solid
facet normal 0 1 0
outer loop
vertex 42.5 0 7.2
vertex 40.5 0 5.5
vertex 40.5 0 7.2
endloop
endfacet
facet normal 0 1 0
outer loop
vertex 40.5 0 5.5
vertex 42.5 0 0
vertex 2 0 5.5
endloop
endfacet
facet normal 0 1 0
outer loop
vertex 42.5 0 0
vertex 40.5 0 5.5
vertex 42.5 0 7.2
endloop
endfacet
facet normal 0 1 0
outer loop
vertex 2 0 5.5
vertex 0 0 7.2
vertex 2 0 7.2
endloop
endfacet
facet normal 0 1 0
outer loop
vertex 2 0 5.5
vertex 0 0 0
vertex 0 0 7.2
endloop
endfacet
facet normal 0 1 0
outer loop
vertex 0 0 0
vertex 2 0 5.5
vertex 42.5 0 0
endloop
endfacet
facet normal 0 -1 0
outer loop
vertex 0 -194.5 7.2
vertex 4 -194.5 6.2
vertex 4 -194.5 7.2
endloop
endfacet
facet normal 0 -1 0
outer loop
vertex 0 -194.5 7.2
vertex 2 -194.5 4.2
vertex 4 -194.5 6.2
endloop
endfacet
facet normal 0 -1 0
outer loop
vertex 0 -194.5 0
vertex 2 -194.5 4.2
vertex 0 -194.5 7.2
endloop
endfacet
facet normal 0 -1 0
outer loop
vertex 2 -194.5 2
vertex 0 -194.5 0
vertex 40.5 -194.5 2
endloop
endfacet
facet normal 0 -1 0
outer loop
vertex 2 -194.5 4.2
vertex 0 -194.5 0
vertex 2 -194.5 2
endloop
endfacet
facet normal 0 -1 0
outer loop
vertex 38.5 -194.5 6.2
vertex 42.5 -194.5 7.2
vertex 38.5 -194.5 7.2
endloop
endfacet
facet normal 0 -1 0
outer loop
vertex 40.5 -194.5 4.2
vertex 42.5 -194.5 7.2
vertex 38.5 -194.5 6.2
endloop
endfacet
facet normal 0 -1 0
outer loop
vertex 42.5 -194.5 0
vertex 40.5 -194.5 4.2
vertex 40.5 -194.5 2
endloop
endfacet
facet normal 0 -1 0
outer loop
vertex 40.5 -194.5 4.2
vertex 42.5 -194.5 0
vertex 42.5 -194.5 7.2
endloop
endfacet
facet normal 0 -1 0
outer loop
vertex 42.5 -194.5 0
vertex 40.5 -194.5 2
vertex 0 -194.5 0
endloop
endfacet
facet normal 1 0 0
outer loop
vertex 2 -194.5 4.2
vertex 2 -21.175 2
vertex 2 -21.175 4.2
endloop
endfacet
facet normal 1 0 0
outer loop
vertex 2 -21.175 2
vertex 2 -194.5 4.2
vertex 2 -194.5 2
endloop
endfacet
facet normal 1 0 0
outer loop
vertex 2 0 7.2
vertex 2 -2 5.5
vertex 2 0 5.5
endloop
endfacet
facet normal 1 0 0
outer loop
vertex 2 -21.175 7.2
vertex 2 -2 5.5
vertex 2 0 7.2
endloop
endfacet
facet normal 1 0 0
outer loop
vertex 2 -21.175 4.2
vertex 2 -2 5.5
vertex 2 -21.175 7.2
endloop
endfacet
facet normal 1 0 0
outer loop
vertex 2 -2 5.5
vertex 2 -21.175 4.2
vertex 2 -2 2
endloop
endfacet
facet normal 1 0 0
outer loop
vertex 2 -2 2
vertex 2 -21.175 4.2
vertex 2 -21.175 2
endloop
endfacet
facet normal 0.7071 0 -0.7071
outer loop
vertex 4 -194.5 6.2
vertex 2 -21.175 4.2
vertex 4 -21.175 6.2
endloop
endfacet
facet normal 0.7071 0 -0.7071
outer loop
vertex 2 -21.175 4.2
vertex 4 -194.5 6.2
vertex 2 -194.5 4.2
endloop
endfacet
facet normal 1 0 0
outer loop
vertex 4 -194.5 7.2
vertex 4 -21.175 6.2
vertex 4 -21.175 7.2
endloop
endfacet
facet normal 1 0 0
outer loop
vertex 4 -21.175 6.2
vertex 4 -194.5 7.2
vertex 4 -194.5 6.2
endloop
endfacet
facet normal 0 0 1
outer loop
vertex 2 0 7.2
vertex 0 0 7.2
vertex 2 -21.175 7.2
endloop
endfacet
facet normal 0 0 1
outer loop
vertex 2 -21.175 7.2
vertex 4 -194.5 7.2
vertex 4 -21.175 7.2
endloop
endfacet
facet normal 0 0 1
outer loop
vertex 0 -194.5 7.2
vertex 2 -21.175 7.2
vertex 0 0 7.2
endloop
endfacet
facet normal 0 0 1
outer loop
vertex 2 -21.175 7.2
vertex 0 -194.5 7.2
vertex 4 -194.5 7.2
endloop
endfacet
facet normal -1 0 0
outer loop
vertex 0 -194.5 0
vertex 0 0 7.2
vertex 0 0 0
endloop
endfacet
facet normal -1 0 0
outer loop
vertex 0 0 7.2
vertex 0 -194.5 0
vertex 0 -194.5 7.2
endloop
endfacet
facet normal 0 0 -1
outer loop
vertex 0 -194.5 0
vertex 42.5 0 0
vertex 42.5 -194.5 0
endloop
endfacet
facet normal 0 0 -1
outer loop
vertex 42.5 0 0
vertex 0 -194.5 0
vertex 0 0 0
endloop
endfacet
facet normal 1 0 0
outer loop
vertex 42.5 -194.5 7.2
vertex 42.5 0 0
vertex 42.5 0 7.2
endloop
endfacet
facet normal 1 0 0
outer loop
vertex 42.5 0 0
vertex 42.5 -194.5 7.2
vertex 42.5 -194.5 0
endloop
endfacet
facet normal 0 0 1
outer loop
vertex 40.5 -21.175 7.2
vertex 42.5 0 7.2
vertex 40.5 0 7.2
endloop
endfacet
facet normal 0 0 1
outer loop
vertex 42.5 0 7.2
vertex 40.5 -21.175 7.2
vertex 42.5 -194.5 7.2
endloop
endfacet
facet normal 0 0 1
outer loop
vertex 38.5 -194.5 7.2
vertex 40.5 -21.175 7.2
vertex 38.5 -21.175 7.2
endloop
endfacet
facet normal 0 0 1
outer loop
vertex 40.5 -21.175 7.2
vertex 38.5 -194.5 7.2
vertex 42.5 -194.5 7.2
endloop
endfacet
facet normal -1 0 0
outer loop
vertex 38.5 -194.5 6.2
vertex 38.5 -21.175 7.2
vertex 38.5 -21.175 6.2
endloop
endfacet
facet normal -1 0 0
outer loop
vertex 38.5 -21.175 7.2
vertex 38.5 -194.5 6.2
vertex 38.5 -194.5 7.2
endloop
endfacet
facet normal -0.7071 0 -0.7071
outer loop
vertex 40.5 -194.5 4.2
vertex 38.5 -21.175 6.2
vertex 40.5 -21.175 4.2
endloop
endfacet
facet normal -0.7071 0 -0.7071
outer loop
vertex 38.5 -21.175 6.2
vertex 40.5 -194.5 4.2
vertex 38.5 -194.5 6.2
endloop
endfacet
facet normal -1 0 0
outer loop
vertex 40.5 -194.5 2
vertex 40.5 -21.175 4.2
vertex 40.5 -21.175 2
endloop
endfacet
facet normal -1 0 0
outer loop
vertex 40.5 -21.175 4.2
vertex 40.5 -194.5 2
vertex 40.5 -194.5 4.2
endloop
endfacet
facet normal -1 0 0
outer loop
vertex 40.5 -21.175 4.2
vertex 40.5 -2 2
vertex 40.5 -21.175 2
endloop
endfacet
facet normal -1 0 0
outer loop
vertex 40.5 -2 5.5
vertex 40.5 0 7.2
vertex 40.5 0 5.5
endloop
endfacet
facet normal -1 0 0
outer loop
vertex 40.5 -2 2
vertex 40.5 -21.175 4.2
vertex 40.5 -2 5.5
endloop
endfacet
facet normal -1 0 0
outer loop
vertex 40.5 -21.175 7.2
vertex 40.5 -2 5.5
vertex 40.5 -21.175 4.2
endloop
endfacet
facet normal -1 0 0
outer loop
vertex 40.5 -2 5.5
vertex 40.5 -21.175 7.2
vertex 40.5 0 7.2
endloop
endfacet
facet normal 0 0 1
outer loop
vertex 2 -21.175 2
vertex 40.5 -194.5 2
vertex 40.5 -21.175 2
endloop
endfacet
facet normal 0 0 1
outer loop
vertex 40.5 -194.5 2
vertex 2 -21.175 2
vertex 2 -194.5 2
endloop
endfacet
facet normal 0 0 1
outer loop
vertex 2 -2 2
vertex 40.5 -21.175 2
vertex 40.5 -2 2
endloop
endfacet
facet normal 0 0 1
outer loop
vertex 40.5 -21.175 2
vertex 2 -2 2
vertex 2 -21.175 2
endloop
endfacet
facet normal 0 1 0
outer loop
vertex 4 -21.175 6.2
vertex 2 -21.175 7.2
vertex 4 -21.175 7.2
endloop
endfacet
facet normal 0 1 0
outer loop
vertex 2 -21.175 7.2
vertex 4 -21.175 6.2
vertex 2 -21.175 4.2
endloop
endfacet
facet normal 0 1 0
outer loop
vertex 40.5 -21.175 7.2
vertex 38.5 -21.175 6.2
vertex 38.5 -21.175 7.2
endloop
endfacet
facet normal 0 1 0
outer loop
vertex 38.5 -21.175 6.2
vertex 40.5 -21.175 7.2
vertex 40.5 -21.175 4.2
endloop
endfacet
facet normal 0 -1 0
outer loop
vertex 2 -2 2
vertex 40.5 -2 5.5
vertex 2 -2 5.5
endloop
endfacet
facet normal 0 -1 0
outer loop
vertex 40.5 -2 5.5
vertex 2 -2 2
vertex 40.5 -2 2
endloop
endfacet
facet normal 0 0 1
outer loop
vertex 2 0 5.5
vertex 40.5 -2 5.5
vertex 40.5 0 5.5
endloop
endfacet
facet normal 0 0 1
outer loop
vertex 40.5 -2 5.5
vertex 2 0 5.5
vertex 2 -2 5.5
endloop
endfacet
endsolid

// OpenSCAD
capsuleholder(5);

module capsuleholder (num_capsules)
{
	//Info about nespresso capsules.
	//Nespresso capsule 'flange' is 37mm in diameter.
	capsule_diameter=38.5;
	//Capsule flange thickness
	capsule_flange_thickness=2.2;

	//How thick the plastic walls should be.
	wall_thickness = 2;
	//Thickness of the side retaining lugs
	side_lug_thickness = 1;
	//How much of a capsule height the opening at the bottom to take the capsule out should be
	capsule_removal_gap = 0.55;
	//bottom lug height
	bottom_lug_height = 3.5;


	overall_width = capsule_diameter + wall_thickness * 2;
	overall_thickness = capsule_flange_thickness + wall_thickness * 2 + side_lug_thickness;
	overall_height = num_capsules * capsule_diameter + wall_thickness; //Wall thickness is for bottom lug

	//Print some object info
	echo("Overall width of holder is" , overall_width, "mm");
	echo ("Overall height is ", overall_height, "mm");
	echo ("Overall thickness is ", overall_thickness, "mm");

	rotate ([90,0,0]) {  //Lie the object down so we can print it in a sensible orientation.
		
		union() {//to put the bottom lug in
			difference() {
		
				//Capsule holder main section
				linear_extrude(height = overall_height){
					difference() {
						//Main outline
						square([overall_width,overall_thickness]);
		
						//Take out a capsule-flange sized slot.
						translate([wall_thickness,wall_thickness])square([capsule_diameter, capsule_flange_thickness]);
		
						//Take out the front wall.
						translate([wall_thickness*2, wall_thickness]) square(capsule_diameter - wall_thickness*2, wall_thickness);
			
						//Remove two triangle-shaped polygons to leave the retaining lugs in a way that they can print
						 translate([wall_thickness, wall_thickness+capsule_flange_thickness]) polygon([[0,0],[wall_thickness,0], [wall_thickness,	 wall_thickness]]);

						translate([capsule_diameter, wall_thickness+capsule_flange_thickness]) polygon([[0,0],[0,wall_thickness], [wall_thickness,0]]);
					}
				}
				//Cut out the retaining lugs at the bottom of the holder so the capsules can be removed
				linear_extrude(height = capsule_diameter * capsule_removal_gap) translate([wall_thickness, wall_thickness]) 
						square([capsule_diameter, wall_thickness+capsule_flange_thickness + side_lug_thickness]);
		
				//Put in screw holes
			}
			//Bottom lug (unioned with the structure above.	
			linear_extrude(height = wall_thickness)  square ([overall_width, wall_thickness + bottom_lug_height]);
		}
	}
}
